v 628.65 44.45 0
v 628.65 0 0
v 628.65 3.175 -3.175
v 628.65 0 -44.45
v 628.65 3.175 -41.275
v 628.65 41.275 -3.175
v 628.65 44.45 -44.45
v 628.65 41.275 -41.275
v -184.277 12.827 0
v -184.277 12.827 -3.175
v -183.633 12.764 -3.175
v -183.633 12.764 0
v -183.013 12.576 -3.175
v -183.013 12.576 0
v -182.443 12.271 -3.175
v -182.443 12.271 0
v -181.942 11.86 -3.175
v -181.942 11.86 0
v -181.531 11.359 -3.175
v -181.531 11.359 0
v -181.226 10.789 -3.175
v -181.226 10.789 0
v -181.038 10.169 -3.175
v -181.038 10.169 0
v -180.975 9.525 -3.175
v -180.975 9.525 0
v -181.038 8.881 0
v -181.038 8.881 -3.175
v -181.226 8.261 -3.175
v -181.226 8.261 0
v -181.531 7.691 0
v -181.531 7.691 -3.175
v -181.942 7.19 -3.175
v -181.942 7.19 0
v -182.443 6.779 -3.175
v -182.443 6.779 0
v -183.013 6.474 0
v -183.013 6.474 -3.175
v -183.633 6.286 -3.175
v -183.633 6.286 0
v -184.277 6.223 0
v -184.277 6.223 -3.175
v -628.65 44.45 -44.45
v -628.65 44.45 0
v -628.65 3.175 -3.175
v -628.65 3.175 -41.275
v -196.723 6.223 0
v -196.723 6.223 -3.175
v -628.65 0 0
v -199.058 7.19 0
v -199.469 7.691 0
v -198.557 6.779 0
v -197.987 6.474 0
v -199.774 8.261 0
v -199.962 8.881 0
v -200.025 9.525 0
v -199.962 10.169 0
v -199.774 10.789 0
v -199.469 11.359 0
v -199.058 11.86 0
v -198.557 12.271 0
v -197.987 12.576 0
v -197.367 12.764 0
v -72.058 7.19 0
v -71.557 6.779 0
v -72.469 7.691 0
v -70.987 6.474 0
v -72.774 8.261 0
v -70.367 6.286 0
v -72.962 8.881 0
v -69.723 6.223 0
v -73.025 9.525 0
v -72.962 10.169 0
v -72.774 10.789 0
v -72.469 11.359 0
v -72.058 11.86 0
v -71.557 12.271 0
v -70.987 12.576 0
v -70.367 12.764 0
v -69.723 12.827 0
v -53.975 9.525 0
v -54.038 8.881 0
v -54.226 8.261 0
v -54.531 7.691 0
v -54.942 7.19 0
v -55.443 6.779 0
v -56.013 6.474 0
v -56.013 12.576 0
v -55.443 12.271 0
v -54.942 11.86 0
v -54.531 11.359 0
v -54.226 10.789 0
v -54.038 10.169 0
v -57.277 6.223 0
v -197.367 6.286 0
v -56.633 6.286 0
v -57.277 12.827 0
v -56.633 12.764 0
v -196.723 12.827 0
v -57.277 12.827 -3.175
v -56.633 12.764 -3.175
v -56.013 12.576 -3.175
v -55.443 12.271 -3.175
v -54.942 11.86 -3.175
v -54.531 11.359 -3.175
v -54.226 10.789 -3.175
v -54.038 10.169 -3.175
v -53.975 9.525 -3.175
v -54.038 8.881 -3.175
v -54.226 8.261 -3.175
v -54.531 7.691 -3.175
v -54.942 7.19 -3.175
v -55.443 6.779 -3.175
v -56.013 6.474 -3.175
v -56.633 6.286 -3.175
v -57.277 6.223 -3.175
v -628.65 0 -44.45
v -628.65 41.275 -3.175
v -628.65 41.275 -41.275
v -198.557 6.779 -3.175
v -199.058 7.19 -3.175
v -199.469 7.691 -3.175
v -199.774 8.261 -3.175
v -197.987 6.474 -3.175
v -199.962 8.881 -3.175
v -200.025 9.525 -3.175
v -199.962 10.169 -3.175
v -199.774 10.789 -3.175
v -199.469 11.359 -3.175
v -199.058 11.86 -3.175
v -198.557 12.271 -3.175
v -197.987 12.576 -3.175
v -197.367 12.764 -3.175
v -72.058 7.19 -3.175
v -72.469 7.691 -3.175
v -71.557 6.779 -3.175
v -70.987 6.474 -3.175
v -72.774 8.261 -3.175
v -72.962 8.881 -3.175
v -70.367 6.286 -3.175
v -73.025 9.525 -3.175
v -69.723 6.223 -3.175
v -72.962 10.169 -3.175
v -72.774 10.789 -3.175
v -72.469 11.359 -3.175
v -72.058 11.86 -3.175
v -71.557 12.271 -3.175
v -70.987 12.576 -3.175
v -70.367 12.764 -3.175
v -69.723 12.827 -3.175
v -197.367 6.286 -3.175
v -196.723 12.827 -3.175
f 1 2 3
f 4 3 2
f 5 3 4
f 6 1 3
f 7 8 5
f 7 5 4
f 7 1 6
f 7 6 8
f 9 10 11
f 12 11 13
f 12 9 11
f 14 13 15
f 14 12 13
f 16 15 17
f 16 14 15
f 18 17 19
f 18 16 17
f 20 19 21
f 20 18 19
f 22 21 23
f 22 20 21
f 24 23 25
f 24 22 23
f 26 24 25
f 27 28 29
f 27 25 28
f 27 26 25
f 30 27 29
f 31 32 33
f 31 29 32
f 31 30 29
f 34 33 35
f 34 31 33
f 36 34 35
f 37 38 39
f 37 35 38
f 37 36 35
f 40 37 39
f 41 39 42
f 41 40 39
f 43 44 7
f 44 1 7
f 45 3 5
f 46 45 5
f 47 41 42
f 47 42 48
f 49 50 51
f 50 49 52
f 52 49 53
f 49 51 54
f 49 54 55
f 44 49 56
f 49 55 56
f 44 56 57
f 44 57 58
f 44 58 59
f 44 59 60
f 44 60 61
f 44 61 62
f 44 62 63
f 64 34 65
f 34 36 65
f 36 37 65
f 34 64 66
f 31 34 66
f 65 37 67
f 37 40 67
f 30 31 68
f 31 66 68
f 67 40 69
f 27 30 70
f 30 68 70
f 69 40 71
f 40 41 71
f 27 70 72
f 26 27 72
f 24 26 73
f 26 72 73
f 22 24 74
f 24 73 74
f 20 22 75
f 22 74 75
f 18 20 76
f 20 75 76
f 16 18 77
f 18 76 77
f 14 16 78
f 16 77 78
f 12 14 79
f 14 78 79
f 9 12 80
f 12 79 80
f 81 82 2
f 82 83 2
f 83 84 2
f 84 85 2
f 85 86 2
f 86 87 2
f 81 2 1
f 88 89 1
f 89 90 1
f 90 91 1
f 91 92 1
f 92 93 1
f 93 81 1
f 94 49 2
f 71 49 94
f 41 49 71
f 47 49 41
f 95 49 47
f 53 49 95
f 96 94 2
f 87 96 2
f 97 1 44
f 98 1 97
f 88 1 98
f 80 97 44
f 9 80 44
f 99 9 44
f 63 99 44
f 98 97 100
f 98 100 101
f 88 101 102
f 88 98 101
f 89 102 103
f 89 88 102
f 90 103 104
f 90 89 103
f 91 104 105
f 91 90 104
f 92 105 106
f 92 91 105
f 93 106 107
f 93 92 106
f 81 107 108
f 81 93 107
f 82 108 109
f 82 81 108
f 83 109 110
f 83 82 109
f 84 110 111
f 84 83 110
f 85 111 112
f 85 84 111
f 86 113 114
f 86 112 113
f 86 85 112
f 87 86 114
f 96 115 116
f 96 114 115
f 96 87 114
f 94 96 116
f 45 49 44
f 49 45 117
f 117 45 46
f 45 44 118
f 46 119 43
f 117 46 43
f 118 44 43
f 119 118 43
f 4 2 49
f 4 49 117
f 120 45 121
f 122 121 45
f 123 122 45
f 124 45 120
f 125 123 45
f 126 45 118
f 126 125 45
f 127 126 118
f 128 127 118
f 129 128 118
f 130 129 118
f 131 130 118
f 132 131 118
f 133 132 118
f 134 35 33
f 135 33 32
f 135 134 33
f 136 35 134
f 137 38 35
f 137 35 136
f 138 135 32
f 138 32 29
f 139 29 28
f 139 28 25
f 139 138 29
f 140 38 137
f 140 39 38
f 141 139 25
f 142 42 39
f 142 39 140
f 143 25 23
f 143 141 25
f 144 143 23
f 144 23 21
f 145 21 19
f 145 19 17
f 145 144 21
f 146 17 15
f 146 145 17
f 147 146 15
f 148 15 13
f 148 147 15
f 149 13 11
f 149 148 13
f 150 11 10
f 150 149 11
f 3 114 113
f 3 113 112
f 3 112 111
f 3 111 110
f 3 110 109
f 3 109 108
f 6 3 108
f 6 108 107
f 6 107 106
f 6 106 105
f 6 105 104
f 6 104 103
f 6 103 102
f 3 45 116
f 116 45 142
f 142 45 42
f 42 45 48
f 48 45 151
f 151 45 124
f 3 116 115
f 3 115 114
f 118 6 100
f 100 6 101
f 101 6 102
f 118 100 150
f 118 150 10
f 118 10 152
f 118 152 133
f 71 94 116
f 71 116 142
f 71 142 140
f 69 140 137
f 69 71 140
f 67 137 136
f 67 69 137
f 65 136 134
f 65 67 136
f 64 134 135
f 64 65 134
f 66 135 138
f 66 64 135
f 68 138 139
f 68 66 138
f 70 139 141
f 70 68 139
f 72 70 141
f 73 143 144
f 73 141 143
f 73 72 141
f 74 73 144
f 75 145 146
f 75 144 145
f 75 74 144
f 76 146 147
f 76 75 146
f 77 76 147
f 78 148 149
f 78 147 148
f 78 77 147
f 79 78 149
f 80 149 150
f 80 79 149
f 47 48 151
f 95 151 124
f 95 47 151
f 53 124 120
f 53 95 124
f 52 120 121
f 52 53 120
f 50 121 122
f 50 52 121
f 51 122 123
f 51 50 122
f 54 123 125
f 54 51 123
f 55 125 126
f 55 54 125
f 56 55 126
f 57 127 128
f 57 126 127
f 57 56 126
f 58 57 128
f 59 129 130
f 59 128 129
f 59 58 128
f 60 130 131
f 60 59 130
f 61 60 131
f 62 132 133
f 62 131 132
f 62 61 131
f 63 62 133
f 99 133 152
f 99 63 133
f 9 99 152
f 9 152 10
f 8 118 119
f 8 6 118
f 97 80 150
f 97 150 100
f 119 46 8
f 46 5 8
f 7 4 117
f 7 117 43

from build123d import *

# Parameters (mm, degrees)
SKETCH1_W           = 44.45
SKETCH1_H           = 44.45
SKETCH1_W_2         = 38.1
SKETCH1_H_2         = 38.1
BOSS_EXTRUDE1_DEPTH = 628.65
CUT_EXTRUDE1_REACH  = 46.45


with BuildPart() as part:
    # Sketch1 → Boss-Extrude1 (new body, symmetric)
    with BuildSketch(Plane(origin=(0, 0, 0), x_dir=(0, 0, -1), z_dir=(1, 0, 0))):
        with Locations((22.225, 22.225)):
            Rectangle(SKETCH1_W, SKETCH1_H)
        with Locations((22.225, 22.225)):
            Rectangle(SKETCH1_W_2, SKETCH1_H_2, mode=Mode.SUBTRACT)
    extrude(amount=BOSS_EXTRUDE1_DEPTH, both=True)

    # Sketch2 → Cut-Extrude1 (cut, up to next)
    with BuildSketch(Plane.XY, mode=Mode.PRIVATE) as cut_extrude1_sk1:
        with BuildLine():
            Line((-196.723, 12.827), (-184.277, 12.827))
            ThreePointArc((-184.277, 12.827), (-180.975, 9.525), (-184.277, 6.223))
            Line((-184.277, 6.223), (-196.723, 6.223))
            ThreePointArc((-196.723, 6.223), (-200.025, 9.525), (-196.723, 12.827))
        make_face()
    cut_extrude1_tool1 = extrude(cut_extrude1_sk1.sketch, amount=-CUT_EXTRUDE1_REACH, mode=Mode.PRIVATE) & part.part
    add(cut_extrude1_tool1.solids().sort_by_distance((-190.5, 9.525, 0))[0], mode=Mode.SUBTRACT)
    # Sketch2 → Cut-Extrude1 (cut, up to next)
    with BuildSketch(Plane.XY, mode=Mode.PRIVATE) as cut_extrude1_sk2:
        with BuildLine():
            Line((-69.723, 12.827), (-57.277, 12.827))
            ThreePointArc((-57.277, 12.827), (-53.975, 9.525), (-57.277, 6.223))
            Line((-57.277, 6.223), (-69.723, 6.223))
            ThreePointArc((-69.723, 6.223), (-73.025, 9.525), (-69.723, 12.827))
        make_face()
    cut_extrude1_tool2 = extrude(cut_extrude1_sk2.sketch, amount=-CUT_EXTRUDE1_REACH, mode=Mode.PRIVATE) & part.part
    add(cut_extrude1_tool2.solids().sort_by_distance((-63.5, 9.525, 0))[0], mode=Mode.SUBTRACT)


solid = part.part
